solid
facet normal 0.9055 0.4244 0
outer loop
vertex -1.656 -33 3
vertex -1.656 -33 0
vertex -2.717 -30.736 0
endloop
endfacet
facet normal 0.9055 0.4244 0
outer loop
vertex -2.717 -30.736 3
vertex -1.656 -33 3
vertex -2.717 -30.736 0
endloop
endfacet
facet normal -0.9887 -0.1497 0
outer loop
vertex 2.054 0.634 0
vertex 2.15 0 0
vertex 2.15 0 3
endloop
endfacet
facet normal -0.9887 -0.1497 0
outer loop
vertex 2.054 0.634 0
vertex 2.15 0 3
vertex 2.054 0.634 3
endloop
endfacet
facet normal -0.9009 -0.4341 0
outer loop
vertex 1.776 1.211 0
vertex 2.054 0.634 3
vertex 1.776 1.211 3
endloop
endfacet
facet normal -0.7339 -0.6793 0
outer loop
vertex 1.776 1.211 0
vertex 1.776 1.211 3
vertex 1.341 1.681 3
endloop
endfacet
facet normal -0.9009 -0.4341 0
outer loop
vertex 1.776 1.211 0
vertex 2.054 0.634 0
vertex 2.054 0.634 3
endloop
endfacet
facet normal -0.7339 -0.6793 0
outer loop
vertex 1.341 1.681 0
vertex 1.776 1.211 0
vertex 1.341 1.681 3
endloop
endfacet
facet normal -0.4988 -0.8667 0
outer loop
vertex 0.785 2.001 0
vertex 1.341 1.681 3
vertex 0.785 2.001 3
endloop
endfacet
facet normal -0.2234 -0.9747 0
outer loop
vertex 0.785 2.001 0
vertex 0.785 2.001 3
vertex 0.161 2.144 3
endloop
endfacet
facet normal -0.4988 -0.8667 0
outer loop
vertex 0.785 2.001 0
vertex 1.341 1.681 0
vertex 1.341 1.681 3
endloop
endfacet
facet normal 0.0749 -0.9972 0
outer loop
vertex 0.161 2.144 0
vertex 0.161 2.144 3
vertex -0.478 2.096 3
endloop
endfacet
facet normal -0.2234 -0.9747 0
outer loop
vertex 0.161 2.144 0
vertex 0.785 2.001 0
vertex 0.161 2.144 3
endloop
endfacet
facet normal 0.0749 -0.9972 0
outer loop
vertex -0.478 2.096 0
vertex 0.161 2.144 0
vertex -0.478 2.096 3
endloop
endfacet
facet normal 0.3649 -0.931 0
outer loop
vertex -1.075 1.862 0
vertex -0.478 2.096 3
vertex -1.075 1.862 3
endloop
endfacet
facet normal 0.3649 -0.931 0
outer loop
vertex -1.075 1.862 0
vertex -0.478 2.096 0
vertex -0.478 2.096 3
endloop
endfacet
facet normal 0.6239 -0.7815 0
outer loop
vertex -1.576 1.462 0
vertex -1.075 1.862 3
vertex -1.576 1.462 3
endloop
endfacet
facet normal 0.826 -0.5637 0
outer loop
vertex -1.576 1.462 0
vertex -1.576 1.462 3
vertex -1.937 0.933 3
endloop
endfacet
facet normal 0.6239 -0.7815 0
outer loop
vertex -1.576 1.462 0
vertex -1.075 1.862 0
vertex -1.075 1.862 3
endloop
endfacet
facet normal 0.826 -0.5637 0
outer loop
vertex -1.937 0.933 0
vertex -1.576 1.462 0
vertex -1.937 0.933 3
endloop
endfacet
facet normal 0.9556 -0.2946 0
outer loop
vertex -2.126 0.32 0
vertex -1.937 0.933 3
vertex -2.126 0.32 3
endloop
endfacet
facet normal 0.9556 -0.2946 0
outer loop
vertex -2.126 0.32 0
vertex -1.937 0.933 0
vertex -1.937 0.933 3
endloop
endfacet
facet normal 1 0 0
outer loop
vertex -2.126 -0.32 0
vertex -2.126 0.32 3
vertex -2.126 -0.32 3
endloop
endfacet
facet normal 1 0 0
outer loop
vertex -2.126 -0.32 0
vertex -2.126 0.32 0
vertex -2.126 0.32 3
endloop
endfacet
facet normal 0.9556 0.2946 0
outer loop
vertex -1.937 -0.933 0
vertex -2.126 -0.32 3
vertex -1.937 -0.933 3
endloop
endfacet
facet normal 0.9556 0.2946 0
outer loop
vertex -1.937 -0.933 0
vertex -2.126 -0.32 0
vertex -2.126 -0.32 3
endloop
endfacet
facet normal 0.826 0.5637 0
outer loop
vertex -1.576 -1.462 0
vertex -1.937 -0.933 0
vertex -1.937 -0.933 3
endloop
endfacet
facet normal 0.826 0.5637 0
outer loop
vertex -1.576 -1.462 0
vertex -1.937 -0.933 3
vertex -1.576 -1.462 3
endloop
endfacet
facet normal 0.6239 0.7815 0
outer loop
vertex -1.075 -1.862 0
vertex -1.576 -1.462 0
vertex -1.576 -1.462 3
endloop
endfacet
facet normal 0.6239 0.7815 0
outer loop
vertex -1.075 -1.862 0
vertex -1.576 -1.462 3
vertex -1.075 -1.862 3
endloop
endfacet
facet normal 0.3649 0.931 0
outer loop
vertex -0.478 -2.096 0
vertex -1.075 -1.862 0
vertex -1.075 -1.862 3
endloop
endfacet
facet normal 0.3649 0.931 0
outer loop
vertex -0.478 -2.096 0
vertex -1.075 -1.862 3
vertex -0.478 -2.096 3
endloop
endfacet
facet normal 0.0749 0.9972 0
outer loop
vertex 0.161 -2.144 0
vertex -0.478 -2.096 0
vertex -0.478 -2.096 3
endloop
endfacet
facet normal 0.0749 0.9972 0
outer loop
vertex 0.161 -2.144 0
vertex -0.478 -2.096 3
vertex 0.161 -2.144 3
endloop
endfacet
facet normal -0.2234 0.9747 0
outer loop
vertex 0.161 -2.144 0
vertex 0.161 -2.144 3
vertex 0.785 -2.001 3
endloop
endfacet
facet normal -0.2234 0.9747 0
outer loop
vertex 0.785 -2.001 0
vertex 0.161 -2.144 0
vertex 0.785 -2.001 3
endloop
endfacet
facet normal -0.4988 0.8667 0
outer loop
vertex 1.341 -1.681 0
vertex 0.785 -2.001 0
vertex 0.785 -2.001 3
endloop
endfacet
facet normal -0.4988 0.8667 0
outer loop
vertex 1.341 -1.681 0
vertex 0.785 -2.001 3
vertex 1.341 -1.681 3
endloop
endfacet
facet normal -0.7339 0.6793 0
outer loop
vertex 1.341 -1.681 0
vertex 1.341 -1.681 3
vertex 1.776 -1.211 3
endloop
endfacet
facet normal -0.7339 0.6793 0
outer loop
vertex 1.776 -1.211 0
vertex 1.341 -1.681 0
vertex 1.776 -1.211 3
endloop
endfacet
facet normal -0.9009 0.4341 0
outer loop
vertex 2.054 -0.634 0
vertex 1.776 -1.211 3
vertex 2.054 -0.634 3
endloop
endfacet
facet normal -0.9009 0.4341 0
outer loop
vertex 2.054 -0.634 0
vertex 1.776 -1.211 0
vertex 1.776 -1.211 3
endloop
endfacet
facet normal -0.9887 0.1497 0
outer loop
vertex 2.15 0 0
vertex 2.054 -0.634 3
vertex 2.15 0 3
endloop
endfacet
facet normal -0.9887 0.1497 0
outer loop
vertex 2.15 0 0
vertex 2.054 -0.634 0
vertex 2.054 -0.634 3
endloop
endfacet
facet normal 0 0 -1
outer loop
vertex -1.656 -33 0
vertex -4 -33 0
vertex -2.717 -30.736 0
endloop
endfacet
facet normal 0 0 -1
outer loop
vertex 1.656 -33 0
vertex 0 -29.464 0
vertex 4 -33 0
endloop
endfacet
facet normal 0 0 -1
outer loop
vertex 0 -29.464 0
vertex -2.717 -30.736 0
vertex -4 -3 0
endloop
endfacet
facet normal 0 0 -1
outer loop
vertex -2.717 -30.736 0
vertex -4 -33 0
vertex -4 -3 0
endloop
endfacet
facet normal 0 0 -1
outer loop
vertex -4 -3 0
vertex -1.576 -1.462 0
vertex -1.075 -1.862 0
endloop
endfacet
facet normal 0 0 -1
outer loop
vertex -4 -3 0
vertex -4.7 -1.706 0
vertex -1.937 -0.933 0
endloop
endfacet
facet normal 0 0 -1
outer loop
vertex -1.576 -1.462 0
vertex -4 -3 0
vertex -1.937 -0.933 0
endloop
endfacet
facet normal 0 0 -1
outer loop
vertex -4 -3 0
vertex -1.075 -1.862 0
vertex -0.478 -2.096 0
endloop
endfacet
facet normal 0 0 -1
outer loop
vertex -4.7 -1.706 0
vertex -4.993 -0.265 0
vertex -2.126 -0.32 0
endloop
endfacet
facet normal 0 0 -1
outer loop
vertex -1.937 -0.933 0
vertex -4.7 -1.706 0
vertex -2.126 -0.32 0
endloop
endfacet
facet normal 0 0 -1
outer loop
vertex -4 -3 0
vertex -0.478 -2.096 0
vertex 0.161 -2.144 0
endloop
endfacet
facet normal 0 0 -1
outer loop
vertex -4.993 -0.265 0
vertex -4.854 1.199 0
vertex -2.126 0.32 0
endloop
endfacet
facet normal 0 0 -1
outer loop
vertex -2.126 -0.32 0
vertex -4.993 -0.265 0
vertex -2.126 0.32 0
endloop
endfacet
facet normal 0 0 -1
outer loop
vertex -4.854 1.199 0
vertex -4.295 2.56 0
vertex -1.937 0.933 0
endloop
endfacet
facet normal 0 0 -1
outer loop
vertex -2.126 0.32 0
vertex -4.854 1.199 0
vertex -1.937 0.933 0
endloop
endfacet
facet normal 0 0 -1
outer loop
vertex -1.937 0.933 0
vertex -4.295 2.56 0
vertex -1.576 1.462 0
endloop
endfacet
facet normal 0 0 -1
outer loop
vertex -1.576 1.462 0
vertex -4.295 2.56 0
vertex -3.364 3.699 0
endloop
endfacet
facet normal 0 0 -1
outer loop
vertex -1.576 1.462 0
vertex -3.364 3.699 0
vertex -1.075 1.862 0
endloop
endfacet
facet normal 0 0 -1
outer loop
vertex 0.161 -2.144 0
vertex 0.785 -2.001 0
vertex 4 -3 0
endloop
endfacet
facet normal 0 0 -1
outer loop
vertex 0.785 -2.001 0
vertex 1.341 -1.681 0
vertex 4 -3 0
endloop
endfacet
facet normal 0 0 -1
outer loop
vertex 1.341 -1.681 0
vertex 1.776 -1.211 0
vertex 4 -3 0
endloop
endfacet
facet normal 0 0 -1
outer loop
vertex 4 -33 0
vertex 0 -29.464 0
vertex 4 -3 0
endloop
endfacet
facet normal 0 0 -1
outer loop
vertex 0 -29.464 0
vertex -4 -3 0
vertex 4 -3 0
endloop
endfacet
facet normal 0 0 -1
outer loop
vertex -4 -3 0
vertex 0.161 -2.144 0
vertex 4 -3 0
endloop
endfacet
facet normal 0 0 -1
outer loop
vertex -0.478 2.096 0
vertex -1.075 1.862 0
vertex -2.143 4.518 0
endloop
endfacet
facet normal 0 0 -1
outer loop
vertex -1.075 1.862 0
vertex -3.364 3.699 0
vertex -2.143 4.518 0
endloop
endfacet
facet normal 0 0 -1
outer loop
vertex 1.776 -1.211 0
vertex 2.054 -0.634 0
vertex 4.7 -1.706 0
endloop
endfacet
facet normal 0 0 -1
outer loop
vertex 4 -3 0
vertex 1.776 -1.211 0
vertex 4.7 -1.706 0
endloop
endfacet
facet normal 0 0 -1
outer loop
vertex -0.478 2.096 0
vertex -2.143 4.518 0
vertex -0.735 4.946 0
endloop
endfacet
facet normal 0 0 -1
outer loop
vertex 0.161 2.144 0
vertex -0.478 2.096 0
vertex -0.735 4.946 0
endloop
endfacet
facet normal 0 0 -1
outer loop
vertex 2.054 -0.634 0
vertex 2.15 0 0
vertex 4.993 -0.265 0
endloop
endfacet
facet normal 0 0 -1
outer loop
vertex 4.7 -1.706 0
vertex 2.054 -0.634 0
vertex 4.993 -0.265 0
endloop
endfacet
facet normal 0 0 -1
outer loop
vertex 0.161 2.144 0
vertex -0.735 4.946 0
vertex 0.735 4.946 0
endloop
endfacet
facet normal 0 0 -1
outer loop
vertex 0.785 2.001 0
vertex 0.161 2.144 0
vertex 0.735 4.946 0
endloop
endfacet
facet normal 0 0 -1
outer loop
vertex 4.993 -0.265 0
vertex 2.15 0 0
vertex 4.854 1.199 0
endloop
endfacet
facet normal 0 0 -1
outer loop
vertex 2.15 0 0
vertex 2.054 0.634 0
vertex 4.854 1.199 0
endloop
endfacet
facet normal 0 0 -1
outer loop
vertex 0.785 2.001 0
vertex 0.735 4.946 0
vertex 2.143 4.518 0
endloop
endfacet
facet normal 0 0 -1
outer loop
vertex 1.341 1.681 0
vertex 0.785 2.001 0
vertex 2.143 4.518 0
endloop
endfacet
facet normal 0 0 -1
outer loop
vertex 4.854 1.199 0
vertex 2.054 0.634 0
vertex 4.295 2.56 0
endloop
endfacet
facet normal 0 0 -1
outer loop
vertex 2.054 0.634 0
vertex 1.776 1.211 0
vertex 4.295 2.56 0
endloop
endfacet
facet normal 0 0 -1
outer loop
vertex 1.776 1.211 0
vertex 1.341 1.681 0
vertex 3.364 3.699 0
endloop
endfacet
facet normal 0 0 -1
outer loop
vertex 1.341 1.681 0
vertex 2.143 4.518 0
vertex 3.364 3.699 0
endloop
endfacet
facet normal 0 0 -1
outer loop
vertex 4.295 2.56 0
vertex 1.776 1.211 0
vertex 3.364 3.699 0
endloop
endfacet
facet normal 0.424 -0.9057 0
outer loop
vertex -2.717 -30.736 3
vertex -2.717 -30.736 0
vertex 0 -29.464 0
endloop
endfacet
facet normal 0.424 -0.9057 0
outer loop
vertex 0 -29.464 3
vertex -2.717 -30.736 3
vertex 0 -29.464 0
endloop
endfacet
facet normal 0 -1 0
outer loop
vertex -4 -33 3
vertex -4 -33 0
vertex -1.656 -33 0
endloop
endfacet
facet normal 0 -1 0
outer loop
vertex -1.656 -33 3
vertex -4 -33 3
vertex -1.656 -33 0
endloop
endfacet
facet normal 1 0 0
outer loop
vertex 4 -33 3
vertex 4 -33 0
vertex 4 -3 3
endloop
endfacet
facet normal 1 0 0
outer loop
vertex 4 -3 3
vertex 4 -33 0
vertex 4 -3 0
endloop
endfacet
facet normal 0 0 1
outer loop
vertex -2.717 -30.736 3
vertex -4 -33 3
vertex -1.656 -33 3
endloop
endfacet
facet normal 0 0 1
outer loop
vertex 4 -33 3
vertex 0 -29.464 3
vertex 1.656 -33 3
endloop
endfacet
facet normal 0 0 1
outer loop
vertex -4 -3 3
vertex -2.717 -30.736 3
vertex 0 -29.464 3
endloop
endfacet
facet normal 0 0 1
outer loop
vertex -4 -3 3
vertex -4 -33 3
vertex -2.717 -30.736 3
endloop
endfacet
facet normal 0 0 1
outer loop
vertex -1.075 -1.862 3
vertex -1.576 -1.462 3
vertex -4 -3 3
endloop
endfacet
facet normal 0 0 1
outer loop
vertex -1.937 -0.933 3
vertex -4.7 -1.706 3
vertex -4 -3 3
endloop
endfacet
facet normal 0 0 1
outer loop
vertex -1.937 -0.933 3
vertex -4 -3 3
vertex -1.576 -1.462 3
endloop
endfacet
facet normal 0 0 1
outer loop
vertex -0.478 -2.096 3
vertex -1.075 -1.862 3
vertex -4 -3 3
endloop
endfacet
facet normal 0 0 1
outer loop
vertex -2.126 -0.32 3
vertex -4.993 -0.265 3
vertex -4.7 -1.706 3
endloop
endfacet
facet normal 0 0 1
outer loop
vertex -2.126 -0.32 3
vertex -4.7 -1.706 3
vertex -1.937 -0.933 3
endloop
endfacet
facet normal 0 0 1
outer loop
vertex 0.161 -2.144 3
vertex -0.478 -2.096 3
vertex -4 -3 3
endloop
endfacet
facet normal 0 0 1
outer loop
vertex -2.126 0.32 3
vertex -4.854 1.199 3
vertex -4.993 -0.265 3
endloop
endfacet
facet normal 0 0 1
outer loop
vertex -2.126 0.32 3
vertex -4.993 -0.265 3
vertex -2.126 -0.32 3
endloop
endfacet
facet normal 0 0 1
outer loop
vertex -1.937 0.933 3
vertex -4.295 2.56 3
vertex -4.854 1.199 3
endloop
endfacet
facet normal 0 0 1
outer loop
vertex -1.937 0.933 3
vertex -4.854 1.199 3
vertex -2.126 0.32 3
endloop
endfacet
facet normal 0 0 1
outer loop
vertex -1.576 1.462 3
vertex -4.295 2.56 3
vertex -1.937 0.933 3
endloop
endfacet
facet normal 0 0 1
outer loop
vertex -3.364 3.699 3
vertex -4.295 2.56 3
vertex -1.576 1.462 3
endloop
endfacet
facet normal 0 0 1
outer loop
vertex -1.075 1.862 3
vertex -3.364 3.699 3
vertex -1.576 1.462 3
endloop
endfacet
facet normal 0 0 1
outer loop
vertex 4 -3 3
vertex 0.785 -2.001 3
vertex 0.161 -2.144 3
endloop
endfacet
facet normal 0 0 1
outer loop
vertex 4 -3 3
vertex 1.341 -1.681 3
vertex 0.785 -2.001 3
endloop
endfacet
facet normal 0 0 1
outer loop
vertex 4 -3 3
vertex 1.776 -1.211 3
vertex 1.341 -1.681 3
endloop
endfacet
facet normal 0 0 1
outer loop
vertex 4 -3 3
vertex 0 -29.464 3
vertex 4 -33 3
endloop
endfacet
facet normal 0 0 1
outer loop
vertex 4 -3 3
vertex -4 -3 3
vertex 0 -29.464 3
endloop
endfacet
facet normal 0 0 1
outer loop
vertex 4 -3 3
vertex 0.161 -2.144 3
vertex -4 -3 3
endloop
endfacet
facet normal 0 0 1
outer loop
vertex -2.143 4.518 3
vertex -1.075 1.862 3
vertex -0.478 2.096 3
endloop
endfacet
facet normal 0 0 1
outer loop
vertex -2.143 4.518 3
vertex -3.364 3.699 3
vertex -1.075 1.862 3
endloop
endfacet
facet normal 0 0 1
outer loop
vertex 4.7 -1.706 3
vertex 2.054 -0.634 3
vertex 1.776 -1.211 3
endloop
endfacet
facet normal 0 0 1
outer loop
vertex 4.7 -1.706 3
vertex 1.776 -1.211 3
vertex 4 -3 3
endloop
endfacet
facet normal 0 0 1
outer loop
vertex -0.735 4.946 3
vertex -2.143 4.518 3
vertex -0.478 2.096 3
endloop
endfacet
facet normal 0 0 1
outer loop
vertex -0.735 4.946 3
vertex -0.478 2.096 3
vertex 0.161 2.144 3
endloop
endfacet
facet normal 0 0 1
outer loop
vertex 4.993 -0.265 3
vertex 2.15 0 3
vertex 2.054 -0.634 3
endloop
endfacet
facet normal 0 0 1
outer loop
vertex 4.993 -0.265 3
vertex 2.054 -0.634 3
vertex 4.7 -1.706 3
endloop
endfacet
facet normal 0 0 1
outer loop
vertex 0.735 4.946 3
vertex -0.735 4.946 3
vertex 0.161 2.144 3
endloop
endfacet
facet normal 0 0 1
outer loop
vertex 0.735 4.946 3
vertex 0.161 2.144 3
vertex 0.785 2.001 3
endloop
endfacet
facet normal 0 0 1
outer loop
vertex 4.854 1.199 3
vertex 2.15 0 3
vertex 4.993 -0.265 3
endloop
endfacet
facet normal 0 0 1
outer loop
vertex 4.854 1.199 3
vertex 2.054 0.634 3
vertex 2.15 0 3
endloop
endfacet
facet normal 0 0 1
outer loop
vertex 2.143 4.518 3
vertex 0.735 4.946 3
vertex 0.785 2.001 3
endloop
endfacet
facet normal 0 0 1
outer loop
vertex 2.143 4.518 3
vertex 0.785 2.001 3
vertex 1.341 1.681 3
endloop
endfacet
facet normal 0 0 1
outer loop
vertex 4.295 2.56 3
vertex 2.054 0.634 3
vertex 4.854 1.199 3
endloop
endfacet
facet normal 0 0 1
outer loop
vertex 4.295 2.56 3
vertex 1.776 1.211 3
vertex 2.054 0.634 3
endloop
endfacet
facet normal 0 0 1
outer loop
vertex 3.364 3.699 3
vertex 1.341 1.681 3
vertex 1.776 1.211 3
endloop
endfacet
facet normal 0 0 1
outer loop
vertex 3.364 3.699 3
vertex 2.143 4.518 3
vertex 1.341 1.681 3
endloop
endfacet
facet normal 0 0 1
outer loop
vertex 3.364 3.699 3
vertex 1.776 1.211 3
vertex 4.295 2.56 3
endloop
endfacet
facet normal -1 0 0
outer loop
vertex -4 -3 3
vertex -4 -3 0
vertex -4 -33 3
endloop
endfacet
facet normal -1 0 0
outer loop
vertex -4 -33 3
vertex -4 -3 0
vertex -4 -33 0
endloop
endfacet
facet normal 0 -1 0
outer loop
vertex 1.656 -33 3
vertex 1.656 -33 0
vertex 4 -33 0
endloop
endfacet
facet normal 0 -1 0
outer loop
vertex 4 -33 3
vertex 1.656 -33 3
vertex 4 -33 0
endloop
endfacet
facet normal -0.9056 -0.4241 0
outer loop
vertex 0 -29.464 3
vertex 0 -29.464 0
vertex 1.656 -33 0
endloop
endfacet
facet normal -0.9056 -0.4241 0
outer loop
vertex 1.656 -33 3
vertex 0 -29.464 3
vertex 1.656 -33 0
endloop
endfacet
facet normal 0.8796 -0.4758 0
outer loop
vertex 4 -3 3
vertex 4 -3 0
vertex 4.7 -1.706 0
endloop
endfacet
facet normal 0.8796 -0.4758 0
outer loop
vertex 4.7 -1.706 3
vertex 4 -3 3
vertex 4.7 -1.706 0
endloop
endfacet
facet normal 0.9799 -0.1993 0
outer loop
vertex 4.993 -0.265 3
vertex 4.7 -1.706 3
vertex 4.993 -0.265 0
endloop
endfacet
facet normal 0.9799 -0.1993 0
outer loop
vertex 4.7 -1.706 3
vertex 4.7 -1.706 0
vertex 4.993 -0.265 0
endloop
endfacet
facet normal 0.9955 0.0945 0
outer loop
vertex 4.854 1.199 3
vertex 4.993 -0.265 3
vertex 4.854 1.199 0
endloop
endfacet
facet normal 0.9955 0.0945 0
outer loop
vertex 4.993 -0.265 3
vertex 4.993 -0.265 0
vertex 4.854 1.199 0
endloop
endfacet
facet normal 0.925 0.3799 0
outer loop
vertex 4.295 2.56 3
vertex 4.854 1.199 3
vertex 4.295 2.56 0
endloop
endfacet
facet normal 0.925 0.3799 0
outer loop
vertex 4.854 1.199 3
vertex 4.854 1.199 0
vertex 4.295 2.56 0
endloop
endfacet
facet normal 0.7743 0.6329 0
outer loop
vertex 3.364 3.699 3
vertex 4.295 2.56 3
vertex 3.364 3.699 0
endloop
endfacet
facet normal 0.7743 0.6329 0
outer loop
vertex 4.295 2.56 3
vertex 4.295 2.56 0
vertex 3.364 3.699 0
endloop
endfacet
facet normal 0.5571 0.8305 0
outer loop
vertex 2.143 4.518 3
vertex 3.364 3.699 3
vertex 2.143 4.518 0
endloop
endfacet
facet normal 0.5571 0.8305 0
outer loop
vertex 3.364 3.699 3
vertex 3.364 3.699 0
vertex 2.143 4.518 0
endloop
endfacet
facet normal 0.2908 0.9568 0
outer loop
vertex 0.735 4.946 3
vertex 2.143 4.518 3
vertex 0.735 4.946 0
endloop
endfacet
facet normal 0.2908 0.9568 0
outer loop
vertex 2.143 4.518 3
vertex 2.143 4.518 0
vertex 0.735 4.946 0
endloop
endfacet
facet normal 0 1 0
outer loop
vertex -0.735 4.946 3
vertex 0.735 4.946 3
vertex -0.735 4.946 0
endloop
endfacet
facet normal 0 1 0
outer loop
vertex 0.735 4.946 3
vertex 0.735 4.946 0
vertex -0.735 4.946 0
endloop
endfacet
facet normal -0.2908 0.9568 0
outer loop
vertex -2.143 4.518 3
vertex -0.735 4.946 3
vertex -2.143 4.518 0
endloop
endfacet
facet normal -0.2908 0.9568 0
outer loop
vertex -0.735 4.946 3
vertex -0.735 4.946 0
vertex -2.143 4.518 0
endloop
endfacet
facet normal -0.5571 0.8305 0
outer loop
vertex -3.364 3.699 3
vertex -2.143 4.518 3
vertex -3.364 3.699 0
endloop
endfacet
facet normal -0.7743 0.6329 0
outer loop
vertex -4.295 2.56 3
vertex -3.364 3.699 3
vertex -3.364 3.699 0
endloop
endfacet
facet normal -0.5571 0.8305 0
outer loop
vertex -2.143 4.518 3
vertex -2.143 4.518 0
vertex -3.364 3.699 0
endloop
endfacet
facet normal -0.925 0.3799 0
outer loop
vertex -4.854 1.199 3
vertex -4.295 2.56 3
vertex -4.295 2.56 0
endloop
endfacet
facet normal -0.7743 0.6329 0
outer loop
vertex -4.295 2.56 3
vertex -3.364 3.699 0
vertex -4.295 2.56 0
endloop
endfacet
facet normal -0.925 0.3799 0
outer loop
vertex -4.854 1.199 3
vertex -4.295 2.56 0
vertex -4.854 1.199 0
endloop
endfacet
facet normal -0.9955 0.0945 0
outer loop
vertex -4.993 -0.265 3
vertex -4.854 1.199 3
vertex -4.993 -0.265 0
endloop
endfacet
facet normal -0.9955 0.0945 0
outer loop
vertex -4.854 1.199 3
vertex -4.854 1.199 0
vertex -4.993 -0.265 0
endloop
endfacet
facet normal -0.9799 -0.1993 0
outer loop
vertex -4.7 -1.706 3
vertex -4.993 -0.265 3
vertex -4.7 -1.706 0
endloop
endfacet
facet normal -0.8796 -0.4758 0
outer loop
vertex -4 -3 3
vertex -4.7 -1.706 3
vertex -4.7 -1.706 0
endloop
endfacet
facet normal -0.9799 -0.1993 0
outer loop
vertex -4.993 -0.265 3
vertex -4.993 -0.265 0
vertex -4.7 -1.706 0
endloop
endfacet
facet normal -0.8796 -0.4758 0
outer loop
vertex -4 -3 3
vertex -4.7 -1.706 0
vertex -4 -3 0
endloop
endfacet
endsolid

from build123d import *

# Parameters (mm, degrees)
SKETCH1_R           = 2.15
BOSS_EXTRUDE1_DEPTH = 3


with BuildPart() as part:
    # Sketch1 → Boss-Extrude1 (new body)
    with BuildSketch(Plane.XY):
        with BuildLine():
            Line((4, -33), (4, -3))
            ThreePointArc((4, -3), (0, 5), (-4, -3))
            Line((-4, -3), (-4, -33))
            Line((-4, -33), (-1.656379773, -33))
            Line((-1.656379773, -33), (-2.716768264, -30.736026447))
            Line((-2.716768264, -30.736026447), (0, -29.463560258))
            Line((0, -29.463560258), (1.656379773, -33))
            Line((1.656379773, -33), (4, -33))
        make_face()
        Circle(SKETCH1_R, mode=Mode.SUBTRACT)
    extrude(amount=BOSS_EXTRUDE1_DEPTH)


solid = part.part
